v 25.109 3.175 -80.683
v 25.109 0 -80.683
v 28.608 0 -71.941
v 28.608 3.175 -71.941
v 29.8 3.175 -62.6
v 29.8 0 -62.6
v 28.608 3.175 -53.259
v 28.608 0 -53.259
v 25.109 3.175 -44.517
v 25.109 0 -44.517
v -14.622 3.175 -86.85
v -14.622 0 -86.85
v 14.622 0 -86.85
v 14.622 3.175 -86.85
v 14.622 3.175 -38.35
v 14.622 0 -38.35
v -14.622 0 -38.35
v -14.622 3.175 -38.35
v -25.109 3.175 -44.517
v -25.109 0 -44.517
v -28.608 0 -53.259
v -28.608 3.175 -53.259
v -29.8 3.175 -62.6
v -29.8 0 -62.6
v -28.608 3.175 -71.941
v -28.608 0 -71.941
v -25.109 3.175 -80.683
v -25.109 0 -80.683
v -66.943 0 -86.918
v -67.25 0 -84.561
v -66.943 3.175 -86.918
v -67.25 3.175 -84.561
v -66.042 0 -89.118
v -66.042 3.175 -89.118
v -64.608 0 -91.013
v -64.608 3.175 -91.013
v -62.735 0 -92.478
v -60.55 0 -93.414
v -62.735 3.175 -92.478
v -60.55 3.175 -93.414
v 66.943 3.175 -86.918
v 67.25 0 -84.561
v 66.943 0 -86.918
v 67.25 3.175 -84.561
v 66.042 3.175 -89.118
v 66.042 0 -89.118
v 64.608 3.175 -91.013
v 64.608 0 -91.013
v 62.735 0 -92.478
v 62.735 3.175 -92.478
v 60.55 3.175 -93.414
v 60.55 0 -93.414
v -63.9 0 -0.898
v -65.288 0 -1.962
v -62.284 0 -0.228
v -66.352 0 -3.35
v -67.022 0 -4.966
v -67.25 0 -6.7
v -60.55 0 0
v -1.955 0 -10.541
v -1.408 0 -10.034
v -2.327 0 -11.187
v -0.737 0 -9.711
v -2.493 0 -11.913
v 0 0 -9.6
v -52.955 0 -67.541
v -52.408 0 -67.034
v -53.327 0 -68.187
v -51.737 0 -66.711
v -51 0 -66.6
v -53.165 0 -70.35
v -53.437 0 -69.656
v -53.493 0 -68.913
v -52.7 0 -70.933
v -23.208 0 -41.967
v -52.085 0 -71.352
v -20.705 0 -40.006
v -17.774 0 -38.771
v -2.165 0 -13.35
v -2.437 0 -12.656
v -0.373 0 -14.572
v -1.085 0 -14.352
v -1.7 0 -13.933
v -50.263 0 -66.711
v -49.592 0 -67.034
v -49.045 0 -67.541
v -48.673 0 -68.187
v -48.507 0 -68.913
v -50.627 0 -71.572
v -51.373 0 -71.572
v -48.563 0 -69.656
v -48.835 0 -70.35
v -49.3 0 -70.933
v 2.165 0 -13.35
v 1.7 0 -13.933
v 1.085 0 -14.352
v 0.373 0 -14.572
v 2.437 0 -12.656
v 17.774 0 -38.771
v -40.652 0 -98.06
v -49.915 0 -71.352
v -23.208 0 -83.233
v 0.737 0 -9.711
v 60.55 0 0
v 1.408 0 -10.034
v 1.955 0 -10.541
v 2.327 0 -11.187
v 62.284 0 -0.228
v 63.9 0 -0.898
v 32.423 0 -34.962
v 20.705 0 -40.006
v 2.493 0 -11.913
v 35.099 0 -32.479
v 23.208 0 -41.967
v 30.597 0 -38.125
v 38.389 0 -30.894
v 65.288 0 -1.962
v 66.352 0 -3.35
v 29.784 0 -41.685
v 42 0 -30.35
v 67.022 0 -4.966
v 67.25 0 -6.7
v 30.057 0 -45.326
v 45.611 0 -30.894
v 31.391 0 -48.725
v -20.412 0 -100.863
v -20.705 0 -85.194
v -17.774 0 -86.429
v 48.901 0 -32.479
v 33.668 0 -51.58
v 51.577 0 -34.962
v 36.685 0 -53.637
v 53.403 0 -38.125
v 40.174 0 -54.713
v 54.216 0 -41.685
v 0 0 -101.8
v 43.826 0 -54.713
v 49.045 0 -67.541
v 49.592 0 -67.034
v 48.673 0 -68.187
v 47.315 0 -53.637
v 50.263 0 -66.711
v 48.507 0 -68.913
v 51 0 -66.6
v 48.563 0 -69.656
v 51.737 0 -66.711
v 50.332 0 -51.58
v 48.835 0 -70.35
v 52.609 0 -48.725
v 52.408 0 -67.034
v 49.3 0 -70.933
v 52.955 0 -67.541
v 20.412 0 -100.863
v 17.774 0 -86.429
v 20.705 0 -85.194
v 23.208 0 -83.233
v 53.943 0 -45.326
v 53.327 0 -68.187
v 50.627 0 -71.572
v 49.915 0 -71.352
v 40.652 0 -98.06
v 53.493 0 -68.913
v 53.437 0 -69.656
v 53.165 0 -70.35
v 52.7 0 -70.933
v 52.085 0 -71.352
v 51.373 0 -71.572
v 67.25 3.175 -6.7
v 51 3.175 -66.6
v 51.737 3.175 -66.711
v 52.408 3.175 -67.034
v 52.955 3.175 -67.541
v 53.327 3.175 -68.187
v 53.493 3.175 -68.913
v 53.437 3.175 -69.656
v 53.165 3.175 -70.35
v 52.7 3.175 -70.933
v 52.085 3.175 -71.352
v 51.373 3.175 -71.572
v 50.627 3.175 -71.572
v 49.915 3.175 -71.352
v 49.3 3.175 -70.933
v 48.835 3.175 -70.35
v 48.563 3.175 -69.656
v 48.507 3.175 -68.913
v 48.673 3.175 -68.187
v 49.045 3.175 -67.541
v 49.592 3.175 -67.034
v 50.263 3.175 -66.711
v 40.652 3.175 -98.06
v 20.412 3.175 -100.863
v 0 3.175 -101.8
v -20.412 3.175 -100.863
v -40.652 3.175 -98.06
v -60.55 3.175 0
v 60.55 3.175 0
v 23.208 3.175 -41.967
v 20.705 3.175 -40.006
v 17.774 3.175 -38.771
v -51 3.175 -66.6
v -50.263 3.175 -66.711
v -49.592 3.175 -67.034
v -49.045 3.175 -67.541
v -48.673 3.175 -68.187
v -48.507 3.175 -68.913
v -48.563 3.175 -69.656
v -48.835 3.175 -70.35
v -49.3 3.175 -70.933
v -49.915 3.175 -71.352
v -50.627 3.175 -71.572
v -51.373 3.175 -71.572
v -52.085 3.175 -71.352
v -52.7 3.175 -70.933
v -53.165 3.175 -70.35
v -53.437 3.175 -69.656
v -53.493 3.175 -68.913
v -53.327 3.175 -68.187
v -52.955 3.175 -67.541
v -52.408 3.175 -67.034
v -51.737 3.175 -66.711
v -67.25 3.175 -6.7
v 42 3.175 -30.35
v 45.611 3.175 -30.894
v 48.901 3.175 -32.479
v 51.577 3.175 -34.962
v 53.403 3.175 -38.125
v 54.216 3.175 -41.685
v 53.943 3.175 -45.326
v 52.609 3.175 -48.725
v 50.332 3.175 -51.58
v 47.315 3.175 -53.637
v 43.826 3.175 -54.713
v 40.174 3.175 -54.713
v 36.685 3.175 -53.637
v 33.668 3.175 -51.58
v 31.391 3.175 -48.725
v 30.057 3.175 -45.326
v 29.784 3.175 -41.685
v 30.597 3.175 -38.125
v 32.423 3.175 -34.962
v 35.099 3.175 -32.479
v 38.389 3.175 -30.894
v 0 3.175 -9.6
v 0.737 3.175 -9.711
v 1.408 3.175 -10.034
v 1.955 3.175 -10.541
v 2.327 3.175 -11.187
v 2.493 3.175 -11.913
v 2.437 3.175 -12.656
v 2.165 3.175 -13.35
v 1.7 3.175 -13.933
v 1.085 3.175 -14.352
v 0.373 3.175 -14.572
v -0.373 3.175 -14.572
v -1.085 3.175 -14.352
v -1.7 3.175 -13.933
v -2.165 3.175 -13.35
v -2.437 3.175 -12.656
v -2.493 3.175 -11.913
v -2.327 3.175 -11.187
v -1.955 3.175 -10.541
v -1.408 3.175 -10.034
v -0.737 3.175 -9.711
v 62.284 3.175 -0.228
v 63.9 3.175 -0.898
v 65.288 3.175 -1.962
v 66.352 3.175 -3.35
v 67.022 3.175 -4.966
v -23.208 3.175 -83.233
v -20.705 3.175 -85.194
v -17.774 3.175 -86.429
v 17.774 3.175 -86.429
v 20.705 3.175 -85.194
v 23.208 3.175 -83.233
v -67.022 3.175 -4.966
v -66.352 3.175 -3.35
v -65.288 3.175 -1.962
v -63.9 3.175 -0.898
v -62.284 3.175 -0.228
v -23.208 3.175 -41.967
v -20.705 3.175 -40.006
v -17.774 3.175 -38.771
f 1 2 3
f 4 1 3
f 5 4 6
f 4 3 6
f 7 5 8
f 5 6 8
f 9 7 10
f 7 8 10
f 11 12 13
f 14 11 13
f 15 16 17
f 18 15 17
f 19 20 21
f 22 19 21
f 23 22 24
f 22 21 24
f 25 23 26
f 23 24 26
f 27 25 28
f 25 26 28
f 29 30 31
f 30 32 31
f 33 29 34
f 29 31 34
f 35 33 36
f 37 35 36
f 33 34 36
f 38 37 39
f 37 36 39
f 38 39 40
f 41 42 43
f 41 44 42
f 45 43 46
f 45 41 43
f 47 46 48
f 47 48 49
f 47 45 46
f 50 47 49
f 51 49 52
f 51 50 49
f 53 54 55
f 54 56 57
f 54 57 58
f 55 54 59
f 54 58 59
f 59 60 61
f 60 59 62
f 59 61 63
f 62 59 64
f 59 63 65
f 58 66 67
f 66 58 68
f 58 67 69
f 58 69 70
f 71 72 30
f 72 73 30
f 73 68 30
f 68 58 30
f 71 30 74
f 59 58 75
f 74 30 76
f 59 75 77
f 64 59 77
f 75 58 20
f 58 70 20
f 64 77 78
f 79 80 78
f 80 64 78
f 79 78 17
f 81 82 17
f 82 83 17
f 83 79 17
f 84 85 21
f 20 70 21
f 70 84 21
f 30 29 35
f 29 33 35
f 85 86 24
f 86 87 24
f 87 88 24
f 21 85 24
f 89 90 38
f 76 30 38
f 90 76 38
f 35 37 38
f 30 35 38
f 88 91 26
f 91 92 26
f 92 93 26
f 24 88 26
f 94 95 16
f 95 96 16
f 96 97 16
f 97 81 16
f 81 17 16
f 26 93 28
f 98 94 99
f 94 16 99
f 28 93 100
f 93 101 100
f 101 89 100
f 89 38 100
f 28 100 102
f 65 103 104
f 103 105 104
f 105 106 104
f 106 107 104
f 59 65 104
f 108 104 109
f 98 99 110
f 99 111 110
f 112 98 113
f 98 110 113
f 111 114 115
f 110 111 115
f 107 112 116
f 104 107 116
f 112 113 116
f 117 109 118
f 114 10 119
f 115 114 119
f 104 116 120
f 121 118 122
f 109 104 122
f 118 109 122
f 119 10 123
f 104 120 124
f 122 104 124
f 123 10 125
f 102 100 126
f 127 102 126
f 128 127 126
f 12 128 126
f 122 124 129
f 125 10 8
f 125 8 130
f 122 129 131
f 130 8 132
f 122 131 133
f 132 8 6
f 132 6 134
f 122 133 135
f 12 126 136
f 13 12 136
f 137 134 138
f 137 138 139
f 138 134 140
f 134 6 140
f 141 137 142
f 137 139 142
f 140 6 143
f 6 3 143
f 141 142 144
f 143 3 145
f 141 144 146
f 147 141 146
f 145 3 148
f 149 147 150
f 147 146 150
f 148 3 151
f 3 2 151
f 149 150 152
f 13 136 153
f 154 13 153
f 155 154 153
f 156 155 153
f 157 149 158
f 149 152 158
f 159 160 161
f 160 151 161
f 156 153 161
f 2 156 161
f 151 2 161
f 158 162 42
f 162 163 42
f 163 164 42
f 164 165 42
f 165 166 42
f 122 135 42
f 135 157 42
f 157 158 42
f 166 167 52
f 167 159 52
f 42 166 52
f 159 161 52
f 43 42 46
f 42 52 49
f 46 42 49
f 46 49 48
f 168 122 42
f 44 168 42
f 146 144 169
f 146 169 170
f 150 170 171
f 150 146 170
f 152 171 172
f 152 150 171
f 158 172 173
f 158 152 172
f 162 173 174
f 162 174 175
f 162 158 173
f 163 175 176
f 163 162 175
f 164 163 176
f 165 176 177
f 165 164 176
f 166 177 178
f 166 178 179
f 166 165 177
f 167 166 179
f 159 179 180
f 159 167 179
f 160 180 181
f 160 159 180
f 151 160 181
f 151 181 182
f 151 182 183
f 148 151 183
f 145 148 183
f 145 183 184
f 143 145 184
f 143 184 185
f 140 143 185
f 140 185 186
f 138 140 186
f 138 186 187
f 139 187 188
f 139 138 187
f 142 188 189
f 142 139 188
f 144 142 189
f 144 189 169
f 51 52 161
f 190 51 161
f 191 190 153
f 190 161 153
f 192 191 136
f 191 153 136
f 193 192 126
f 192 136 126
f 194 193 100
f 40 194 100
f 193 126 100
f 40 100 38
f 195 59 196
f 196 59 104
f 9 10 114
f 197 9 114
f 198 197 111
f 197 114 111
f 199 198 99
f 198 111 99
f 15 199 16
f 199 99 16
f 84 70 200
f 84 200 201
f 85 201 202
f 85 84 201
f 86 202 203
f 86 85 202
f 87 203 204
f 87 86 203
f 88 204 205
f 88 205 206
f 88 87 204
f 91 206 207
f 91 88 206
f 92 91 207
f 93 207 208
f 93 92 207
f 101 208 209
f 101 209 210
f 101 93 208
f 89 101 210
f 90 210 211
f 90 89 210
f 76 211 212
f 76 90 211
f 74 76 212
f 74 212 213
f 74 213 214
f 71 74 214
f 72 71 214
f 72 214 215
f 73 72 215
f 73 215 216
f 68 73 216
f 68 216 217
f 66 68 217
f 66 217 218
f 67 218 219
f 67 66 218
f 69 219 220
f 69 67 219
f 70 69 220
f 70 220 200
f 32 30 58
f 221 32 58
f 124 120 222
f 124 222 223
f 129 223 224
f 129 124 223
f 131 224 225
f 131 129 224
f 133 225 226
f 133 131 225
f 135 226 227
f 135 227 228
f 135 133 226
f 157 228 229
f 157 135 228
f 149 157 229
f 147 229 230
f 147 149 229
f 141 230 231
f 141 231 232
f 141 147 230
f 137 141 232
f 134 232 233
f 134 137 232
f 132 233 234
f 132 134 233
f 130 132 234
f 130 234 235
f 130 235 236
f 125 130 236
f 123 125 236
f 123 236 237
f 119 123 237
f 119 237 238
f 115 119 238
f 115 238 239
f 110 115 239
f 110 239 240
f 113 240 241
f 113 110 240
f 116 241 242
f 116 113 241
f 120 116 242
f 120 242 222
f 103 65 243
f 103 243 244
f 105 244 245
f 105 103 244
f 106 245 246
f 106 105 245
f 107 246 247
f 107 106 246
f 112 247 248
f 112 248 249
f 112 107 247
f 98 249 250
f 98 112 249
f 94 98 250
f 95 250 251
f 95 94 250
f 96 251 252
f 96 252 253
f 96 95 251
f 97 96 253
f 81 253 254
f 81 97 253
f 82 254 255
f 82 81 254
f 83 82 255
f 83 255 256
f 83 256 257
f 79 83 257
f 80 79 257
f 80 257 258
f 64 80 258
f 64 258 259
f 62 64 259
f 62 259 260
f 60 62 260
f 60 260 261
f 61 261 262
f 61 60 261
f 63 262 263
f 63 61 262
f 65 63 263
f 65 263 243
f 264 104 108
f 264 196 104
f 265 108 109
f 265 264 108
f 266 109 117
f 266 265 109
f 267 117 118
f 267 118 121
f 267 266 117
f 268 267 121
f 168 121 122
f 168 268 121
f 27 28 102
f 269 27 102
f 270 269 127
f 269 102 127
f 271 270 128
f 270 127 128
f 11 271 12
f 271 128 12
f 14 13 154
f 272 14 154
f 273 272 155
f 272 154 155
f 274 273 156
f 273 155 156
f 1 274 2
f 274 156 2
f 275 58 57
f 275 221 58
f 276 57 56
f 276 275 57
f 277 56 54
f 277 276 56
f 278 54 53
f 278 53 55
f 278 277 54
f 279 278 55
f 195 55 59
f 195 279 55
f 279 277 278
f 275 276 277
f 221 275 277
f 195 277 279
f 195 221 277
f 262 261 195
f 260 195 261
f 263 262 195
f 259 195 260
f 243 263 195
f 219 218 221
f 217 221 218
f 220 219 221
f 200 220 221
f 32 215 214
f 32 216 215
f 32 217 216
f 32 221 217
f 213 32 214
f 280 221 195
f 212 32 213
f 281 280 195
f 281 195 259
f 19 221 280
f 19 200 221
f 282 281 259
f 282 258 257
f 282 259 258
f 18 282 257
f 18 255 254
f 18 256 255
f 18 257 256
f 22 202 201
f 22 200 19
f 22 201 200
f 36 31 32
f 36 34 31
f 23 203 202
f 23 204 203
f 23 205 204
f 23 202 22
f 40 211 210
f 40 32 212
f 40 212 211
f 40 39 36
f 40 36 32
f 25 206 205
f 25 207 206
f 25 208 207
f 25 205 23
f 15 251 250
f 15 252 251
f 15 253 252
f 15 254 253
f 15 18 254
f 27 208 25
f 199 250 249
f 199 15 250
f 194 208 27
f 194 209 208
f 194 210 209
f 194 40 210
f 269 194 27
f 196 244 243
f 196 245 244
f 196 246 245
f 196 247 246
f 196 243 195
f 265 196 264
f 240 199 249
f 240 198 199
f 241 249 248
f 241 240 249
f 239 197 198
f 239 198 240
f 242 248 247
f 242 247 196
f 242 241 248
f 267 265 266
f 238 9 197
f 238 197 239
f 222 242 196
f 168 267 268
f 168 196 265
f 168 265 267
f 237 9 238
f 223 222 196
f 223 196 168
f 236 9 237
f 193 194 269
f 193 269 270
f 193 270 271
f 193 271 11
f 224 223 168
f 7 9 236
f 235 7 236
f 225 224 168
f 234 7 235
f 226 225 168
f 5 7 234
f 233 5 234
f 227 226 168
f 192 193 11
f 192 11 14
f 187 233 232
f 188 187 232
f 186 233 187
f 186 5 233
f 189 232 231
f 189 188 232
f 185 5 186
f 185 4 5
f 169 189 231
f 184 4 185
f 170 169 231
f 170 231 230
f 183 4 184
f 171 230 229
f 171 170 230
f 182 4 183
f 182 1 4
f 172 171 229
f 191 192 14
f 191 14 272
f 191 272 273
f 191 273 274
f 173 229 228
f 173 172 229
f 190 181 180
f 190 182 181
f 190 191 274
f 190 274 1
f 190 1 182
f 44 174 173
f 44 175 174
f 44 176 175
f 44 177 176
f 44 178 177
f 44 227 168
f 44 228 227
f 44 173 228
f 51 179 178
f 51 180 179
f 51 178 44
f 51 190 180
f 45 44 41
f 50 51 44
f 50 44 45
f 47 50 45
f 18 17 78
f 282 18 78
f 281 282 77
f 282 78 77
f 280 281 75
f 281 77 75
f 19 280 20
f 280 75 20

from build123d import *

# Parameters (mm, degrees)
SKETCH1_R           = 2.5
SKETCH1_R_2         = 12.25
BOSS_EXTRUDE1_DEPTH = 3.175
FILLET1_R           = 9.2
FILLET2_R           = 6.7


with BuildPart() as part:
    # Sketch1 → Boss-Extrude1 (new body)
    with BuildSketch(Plane(origin=(0, 0, 0), x_dir=(1, 0, 0), z_dir=(0, 1, 0))):
        with BuildLine():
            Line((-67.25, 0), (67.25, 0))
            Line((67.25, 0), (67.25, 91.408280206))
            ThreePointArc((67.25, 91.408280206), (0, 101.8), (-67.25, 91.408280206))
            Line((-67.25, 91.408280206), (-67.25, 0))
        make_face()
        with Locations(Location((-51, 69.1, 0), (0, 0, 270))):
            Circle(SKETCH1_R, mode=Mode.SUBTRACT)
        with Locations(Location((51, 69.1, 0), (0, 0, 270))):
            Circle(SKETCH1_R, mode=Mode.SUBTRACT)
        with Locations(Location((0, 12.1, 0), (0, 0, 270))):
            Circle(SKETCH1_R, mode=Mode.SUBTRACT)
        with Locations(Location((42, 42.6, 0), (0, 0, 270))):
            Circle(SKETCH1_R_2, mode=Mode.SUBTRACT)
        with BuildLine():
            Line((-14.622204703, 86.85), (14.622204703, 86.85))
            ThreePointArc((14.622204703, 86.85), (20.704967234, 85.194080433), (25.108968848, 80.683333333))
            ThreePointArc((25.108968848, 80.683333333), (29.8, 62.6), (25.108968848, 44.516666667))
            ThreePointArc((25.108968848, 44.516666667), (20.704967234, 40.005919567), (14.622204703, 38.35))
            Line((14.622204703, 38.35), (-14.622204703, 38.35))
            ThreePointArc((-14.622204703, 38.35), (-20.704967234, 40.005919567), (-25.108968848, 44.516666667))
            ThreePointArc((-25.108968848, 44.516666667), (-29.8, 62.6), (-25.108968848, 80.683333333))
            ThreePointArc((-25.108968848, 80.683333333), (-20.704967234, 85.194080433), (-14.622204703, 86.85))
        make_face(mode=Mode.SUBTRACT)
    extrude(amount=BOSS_EXTRUDE1_DEPTH)

    # Fillet1
    fillet1_edges = [part.edges().sort_by_distance(p)[0] for p in [
        (-67.25, 1.5875, -91.408280206),
        (67.25, 1.5875, -91.408280206),
    ]]
    fillet(fillet1_edges, radius=FILLET1_R)

    # Fillet2
    fillet2_edges = [part.edges().sort_by_distance(p)[0] for p in [
        (67.25, 1.5875, 0),
        (-67.25, 1.5875, 0),
    ]]
    fillet(fillet2_edges, radius=FILLET2_R)


solid = part.part
